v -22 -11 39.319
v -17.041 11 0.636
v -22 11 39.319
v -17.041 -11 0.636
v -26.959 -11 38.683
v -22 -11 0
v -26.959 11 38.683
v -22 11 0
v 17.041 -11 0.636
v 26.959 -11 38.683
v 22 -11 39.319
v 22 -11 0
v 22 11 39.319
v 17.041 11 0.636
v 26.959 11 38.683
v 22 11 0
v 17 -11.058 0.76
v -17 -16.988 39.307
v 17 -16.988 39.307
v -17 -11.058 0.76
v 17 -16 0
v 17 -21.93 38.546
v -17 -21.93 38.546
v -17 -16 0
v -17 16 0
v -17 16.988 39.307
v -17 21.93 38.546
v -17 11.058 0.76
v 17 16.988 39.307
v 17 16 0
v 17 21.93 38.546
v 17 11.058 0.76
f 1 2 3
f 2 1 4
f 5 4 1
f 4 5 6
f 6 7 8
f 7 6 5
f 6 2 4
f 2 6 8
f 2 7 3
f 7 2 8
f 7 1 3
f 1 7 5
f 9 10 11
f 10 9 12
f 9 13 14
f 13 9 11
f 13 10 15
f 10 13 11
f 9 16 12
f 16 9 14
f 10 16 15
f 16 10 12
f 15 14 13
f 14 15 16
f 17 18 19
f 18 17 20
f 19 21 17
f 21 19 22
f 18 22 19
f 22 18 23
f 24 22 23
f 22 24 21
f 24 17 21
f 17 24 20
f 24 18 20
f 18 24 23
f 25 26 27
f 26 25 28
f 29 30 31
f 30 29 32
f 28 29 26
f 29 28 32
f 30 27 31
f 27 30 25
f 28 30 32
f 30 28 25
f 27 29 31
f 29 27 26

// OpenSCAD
// Smooth curves
$fs = 0.4;

// Measurements relative to the bottom center of the handle
bottom_width = 34;
bottom_depth = 22;
bottom_height = 16;
top_width = 39;
top_depth = 28;
top_height = 55;

// Calculated values based on those measurements
handle_rise = top_height - bottom_height;
handle_depth_slope = handle_rise / (top_depth - bottom_depth);
handle_width_slope = handle_rise / (top_width - bottom_width);
handle_depth_angle = atan(handle_depth_slope);
handle_width_angle = atan(handle_width_slope);

// Design parameters. These are mostly free.
side_height = top_height - bottom_height;
side_depth = bottom_depth;
side_width = 5;

front_height = side_height;
front_depth = side_width;
front_width = bottom_width;

// Center
//color([1,0,0]) { cube([10,10,10], center = true); }

// Left & Right
lr_x = (bottom_width / 2 ) + side_width;
lr_y = side_depth / 2;
translate([-lr_x, lr_y, 0]) {
	rotate([180, handle_width_angle - 180, 0]) {
		cube([side_height, side_depth, side_width]);
		}
}
translate([lr_x, -lr_y, 0]) {
	rotate([0, -handle_width_angle, 0]) {
		cube([side_height, side_depth, side_width]);
	}
}

// Front & Back
fb_x = front_width / 2;
fb_y = (bottom_depth / 2) + front_depth;
translate([fb_x, -fb_y, 0]) {
	rotate([handle_depth_angle - 180, 180, 0]) {
		cube([front_width, front_height, front_depth]);
	}
}
translate([-fb_x, fb_y, 0]) {
	rotate([handle_depth_angle, 0, 0]) {
		cube([front_width, front_height, front_depth]);
	}
}
